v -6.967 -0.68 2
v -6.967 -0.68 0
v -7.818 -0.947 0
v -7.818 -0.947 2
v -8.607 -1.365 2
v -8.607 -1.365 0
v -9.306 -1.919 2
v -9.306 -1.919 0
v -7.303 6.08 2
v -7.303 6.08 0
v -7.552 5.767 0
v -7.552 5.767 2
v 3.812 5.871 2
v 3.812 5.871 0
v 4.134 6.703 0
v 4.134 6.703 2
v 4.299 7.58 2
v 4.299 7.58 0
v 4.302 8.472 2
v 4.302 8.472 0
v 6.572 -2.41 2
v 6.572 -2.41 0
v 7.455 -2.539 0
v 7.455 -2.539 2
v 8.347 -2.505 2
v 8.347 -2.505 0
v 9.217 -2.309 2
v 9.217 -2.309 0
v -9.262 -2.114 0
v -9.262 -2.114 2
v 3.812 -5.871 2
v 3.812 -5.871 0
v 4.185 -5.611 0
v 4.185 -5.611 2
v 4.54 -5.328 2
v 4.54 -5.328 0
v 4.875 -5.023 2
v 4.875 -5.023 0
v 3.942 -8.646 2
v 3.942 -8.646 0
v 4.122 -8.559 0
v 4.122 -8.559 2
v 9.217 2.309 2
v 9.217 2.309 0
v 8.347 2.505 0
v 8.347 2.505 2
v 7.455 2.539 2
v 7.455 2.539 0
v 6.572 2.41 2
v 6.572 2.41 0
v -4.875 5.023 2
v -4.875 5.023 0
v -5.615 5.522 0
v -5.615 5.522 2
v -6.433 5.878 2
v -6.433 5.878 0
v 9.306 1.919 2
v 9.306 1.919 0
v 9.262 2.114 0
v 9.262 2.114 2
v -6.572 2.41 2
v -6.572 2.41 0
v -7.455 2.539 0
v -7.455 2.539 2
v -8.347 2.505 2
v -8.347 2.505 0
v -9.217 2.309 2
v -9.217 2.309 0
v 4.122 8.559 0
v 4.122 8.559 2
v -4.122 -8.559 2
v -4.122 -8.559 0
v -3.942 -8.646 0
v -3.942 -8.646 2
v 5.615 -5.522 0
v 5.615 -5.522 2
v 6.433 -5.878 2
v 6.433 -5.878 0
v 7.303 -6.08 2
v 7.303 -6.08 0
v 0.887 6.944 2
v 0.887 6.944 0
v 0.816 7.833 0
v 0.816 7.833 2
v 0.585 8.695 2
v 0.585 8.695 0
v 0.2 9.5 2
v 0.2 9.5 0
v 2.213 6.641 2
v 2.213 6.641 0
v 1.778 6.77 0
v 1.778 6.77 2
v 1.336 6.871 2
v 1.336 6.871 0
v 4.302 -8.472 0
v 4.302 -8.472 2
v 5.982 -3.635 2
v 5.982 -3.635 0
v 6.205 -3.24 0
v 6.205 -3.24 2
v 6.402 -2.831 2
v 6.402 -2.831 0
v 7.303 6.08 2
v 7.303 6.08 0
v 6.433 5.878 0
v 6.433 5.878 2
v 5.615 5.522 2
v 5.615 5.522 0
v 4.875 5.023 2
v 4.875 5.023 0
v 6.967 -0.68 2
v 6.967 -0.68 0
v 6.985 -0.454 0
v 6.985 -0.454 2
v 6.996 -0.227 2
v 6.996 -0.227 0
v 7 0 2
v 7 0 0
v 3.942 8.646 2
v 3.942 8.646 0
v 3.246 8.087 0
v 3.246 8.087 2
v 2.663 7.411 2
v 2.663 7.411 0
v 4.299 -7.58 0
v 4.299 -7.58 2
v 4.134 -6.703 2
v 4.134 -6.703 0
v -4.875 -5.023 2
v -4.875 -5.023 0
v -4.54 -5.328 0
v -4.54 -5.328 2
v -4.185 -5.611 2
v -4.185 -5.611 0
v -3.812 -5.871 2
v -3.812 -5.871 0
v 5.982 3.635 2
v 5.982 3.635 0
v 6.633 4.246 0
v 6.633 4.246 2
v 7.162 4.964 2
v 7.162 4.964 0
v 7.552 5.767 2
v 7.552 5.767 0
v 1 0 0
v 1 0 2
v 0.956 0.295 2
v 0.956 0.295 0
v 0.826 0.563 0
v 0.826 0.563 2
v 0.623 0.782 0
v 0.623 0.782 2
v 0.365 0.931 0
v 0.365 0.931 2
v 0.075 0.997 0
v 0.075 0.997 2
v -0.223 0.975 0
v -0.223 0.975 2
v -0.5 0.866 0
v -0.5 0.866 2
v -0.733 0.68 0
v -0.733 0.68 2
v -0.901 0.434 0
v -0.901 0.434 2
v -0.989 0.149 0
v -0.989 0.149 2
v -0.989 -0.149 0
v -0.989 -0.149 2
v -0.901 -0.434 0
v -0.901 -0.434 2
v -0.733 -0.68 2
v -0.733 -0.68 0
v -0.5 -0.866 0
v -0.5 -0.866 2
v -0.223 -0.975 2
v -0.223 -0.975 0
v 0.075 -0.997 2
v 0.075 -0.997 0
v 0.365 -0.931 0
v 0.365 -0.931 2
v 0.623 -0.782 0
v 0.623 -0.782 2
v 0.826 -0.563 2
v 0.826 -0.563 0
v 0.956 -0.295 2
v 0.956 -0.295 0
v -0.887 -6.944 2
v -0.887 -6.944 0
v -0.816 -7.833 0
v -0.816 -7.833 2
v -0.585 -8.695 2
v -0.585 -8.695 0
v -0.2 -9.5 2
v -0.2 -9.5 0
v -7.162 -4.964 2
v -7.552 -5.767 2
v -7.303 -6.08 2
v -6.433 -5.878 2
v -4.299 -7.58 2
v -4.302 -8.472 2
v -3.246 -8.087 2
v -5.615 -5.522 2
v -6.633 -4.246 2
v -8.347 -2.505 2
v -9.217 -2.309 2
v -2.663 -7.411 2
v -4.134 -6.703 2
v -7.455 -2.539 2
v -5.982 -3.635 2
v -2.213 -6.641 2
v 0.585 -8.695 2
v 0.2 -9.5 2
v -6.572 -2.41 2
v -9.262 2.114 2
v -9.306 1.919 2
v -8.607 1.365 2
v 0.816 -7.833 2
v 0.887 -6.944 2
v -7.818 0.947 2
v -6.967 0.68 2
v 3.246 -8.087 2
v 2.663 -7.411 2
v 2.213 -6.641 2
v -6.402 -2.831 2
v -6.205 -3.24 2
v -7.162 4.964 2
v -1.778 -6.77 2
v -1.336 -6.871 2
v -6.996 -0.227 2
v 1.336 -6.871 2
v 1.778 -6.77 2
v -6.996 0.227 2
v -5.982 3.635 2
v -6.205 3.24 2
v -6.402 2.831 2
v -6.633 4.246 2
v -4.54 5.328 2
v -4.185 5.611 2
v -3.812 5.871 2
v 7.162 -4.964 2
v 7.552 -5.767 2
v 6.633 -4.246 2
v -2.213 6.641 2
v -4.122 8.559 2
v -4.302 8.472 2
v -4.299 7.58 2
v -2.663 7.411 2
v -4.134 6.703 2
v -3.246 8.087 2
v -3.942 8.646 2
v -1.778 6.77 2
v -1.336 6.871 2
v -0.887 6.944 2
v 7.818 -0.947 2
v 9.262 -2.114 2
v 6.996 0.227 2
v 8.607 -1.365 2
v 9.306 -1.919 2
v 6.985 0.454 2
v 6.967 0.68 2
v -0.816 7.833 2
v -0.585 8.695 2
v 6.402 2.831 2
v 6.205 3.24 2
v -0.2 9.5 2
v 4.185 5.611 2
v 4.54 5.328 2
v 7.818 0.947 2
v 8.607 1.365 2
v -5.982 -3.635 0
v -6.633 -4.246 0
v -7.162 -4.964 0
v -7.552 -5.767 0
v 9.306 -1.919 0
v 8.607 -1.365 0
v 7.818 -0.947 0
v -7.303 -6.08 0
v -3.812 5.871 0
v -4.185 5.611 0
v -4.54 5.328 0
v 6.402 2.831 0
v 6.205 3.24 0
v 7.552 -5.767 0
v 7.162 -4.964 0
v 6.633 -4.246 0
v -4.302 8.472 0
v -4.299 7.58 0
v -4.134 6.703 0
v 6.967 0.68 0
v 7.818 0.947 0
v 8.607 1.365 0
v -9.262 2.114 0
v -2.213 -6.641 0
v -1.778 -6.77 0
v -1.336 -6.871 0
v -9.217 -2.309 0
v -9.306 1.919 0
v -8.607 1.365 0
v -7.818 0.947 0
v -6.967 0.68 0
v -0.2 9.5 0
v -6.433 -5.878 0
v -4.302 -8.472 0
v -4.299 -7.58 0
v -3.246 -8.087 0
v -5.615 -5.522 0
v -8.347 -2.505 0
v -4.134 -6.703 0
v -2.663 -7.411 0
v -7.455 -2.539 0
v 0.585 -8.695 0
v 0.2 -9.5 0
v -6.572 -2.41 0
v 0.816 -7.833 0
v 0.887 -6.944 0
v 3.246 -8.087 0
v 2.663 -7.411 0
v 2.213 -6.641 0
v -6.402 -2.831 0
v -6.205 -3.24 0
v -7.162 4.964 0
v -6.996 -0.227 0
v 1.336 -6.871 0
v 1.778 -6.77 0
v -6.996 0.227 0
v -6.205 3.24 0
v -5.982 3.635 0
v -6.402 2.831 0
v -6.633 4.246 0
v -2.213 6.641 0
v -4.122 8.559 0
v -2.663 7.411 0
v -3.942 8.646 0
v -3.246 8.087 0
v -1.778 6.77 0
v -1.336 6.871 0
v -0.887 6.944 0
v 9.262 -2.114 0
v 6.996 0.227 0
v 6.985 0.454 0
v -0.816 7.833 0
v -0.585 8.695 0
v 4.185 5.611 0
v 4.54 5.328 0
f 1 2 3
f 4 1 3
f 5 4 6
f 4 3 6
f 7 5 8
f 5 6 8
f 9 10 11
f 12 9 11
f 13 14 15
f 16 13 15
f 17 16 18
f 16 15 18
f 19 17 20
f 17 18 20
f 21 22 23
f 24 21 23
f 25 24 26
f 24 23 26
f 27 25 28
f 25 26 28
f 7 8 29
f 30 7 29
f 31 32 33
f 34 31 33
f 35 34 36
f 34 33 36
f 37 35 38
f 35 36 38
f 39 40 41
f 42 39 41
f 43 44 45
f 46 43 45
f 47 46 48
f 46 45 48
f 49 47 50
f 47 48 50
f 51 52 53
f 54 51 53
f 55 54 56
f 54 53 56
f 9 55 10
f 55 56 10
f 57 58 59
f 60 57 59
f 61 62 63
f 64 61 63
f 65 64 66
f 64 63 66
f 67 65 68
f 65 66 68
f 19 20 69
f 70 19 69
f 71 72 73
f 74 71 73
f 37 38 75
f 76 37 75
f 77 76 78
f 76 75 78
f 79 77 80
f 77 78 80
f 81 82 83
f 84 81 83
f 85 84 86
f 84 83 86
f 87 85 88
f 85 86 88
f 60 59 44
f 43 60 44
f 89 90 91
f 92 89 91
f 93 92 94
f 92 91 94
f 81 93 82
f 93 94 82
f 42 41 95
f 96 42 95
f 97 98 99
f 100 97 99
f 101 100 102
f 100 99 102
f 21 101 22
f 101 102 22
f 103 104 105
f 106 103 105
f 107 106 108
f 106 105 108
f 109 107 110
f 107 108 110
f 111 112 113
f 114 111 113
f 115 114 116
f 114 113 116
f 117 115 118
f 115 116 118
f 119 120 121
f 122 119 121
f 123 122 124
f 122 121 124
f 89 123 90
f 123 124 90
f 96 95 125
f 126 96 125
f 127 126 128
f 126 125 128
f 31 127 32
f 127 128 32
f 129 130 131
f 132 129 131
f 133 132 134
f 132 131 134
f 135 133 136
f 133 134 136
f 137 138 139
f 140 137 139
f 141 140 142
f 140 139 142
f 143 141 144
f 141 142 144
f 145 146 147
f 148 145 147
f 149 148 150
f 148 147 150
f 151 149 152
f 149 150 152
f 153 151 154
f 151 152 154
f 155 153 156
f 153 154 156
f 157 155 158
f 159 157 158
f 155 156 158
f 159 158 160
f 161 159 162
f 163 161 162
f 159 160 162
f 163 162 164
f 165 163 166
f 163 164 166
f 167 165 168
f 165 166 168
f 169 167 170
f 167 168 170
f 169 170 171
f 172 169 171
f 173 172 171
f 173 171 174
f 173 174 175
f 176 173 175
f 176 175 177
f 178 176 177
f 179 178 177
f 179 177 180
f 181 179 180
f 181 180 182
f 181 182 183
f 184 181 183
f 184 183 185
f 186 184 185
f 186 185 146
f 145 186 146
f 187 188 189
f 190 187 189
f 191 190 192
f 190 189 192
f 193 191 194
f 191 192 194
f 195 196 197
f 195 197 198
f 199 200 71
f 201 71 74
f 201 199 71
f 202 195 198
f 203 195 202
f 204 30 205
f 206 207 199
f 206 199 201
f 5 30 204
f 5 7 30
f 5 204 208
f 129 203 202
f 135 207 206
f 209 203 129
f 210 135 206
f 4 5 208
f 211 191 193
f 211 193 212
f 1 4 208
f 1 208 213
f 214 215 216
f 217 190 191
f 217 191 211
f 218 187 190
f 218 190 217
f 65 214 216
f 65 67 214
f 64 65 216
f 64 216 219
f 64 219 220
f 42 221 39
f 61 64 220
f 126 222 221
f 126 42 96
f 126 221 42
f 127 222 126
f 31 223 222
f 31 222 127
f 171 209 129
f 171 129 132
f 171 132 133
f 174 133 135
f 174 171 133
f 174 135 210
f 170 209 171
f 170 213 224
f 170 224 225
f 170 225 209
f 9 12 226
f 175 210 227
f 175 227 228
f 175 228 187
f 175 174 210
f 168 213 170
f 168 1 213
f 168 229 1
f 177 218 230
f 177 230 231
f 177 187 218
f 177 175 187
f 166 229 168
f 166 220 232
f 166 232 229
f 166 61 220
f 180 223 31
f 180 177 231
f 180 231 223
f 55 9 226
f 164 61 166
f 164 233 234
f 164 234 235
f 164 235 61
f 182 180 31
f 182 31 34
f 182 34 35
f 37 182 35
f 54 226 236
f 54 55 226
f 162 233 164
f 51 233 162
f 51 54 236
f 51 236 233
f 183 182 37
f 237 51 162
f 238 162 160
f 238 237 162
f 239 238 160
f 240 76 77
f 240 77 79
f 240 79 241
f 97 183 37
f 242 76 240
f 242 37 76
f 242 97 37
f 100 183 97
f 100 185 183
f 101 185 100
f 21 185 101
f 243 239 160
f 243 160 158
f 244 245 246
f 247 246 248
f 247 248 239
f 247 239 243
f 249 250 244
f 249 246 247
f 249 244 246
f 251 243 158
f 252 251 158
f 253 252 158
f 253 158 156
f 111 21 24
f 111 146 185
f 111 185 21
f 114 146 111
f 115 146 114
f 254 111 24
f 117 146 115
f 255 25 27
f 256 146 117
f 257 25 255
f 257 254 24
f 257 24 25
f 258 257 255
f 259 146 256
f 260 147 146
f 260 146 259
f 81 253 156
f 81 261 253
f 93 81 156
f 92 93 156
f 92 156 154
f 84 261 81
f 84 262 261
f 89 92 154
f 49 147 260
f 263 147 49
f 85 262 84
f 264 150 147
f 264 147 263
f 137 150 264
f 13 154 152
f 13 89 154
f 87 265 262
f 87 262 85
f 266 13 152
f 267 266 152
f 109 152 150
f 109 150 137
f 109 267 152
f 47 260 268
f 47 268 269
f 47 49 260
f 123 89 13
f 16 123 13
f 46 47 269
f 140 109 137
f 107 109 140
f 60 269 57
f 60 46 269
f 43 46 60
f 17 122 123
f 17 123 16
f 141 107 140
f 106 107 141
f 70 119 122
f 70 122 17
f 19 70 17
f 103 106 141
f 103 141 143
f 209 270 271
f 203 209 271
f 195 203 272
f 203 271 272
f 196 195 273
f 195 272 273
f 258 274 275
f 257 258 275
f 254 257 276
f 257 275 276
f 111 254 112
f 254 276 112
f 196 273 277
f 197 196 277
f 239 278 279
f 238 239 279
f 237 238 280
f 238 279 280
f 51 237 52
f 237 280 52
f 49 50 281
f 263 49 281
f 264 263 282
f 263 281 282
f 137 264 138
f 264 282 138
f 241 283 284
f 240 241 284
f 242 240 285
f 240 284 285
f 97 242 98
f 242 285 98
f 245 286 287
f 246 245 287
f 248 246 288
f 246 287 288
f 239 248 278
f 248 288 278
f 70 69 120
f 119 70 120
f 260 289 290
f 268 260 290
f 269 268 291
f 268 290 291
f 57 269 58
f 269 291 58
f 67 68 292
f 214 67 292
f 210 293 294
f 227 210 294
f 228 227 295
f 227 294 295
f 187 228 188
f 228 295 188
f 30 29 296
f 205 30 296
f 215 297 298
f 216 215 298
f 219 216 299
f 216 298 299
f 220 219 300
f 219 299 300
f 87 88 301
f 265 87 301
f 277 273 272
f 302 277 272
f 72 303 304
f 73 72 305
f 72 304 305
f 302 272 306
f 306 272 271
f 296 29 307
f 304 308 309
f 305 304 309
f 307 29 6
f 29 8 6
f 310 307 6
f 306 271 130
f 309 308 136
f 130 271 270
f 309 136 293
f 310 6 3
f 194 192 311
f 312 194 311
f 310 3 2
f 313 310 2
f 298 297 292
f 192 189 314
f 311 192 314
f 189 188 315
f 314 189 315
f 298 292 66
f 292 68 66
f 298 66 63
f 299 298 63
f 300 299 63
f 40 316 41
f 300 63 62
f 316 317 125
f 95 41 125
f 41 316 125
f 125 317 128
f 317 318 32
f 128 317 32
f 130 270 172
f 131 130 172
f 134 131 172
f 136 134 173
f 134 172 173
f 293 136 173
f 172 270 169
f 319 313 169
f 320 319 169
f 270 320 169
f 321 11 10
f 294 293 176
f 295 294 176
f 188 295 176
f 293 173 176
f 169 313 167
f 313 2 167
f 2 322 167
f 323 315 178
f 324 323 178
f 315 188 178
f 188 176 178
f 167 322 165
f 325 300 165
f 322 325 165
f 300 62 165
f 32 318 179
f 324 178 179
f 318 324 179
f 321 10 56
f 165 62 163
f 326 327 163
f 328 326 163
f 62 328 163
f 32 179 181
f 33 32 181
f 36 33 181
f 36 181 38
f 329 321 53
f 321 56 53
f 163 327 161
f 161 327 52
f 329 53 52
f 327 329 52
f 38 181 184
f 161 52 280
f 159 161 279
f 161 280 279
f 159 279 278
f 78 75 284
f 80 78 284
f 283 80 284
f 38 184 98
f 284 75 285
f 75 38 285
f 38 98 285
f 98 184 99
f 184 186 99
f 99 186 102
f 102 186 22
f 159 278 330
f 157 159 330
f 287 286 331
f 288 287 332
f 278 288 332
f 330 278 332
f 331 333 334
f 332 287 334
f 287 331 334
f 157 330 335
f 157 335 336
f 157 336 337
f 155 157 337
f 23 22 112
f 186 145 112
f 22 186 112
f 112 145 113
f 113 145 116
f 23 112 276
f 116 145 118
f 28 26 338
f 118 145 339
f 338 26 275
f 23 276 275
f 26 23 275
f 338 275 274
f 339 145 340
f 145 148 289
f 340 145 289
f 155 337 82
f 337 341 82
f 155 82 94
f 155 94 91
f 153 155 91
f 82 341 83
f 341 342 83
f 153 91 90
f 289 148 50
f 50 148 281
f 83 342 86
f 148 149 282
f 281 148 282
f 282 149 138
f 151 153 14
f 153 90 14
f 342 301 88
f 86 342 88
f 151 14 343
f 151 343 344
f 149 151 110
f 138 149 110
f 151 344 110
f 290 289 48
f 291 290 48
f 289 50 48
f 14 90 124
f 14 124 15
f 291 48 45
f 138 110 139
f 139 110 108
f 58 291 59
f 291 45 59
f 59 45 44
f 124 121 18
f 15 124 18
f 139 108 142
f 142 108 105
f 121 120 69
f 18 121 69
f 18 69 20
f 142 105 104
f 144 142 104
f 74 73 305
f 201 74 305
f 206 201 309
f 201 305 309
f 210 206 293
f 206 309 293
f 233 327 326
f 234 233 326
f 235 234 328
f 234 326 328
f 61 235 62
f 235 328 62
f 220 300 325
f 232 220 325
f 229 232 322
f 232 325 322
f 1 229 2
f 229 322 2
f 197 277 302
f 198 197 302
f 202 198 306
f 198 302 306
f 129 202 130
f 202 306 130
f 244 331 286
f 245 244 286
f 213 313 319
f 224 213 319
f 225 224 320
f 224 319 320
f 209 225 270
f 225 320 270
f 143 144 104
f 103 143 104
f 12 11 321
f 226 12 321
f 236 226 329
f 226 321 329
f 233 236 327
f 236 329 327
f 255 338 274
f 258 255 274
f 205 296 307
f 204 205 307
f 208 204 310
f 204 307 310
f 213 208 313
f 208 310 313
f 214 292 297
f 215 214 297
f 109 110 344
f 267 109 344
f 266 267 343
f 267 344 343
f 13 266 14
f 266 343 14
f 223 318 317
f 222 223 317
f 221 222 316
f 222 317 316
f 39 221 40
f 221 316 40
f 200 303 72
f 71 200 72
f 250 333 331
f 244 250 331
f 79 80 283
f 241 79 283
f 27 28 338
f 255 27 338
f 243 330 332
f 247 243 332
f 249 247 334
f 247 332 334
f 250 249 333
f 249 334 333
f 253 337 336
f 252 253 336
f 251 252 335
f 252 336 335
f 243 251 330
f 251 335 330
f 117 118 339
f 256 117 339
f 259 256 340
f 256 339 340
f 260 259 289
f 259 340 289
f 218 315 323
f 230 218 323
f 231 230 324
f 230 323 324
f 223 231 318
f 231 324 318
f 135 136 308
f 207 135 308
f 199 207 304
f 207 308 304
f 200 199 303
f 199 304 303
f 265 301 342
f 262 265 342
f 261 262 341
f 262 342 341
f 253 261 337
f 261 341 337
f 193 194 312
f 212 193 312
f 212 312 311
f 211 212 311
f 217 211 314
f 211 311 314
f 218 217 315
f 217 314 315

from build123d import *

# Parameters (mm, degrees)
F1_DEPTH = 2
F2_R     = 1
F3_DEPTH = 25


with BuildPart() as f1:
    # F0 (on Top) → F1 (new body)
    with BuildSketch(Plane.XY):
        with BuildLine():
            ThreePointArc((6.966901, -0.679915), (6.99172, -0.34036), (7, 0))
            ThreePointArc((7, 0), (6.99172, 0.34036), (6.966901, 0.679915))
            ThreePointArc((6.966901, 0.679915), (6.824495, 1.557647), (6.571965, 2.410243))
            ThreePointArc((6.571965, 2.410243), (6.306782, 3.037186), (5.981957, 3.635407))
            ThreePointArc((5.981957, 3.635407), (5.47282, 4.364429), (4.875371, 5.023023))
            ThreePointArc((4.875371, 5.023023), (4.364429, 5.47282), (3.812213, 5.870863))
            ThreePointArc((3.812213, 5.870863), (3.037186, 6.306782), (2.213149, 6.640931))
            ThreePointArc((2.213149, 6.640931), (1.557647, 6.824495), (0.887413, 6.943522))
            ThreePointArc((0.887413, 6.943522), (0, 7), (-0.887413, 6.943522))
            ThreePointArc((-0.887413, 6.943522), (-1.557647, 6.824495), (-2.213149, 6.640931))
            ThreePointArc((-2.213149, 6.640931), (-3.037186, 6.306782), (-3.812213, 5.870863))
            ThreePointArc((-3.812213, 5.870863), (-4.364429, 5.47282), (-4.875371, 5.023023))
            ThreePointArc((-4.875371, 5.023023), (-5.47282, 4.364429), (-5.981957, 3.635407))
            ThreePointArc((-5.981957, 3.635407), (-6.306782, 3.037186), (-6.571965, 2.410243))
            ThreePointArc((-6.571965, 2.410243), (-6.824495, 1.557647), (-6.966901, 0.679915))
            ThreePointArc((-6.966901, 0.679915), (-7, 0), (-6.966901, -0.679915))
            ThreePointArc((-6.966901, -0.679915), (-6.824495, -1.557647), (-6.571965, -2.410243))
            ThreePointArc((-6.571965, -2.410243), (-6.306782, -3.037186), (-5.981957, -3.635407))
            ThreePointArc((-5.981957, -3.635407), (-5.47282, -4.364429), (-4.875371, -5.023023))
            ThreePointArc((-4.875371, -5.023023), (-4.364429, -5.47282), (-3.812213, -5.870863))
            ThreePointArc((-3.812213, -5.870863), (-3.037186, -6.306782), (-2.213149, -6.640931))
            ThreePointArc((-2.213149, -6.640931), (-1.557647, -6.824495), (-0.887413, -6.943522))
            ThreePointArc((-0.887413, -6.943522), (0, -7), (0.887413, -6.943522))
            ThreePointArc((0.887413, -6.943522), (1.557647, -6.824495), (2.213149, -6.640931))
            ThreePointArc((2.213149, -6.640931), (3.037186, -6.306782), (3.812213, -5.870863))
            ThreePointArc((3.812213, -5.870863), (4.364429, -5.47282), (4.875371, -5.023023))
            ThreePointArc((4.875371, -5.023023), (5.47282, -4.364429), (5.981957, -3.635407))
            ThreePointArc((5.981957, -3.635407), (6.306782, -3.037186), (6.571965, -2.410243))
            ThreePointArc((6.571965, -2.410243), (6.824495, -1.557647), (6.966901, -0.679915))
        make_face()
        with BuildLine():
            ThreePointArc((6.571965, 2.410243), (6.824495, 1.557647), (6.966901, 0.679915))
            ThreePointArc((6.966901, 0.679915), (8.222094, 1.13804), (9.306319, 1.918963))
            Line((9.306319, 1.918963), (9.261815, 2.113949))
            Line((9.261815, 2.113949), (9.217311, 2.308934))
            ThreePointArc((9.217311, 2.308934), (7.901628, 2.542094), (6.571965, 2.410243))
        make_face()
        with BuildLine():
            ThreePointArc((9.306319, -1.918963), (8.222094, -1.13804), (6.966901, -0.679915))
            ThreePointArc((6.966901, -0.679915), (6.824495, -1.557647), (6.571965, -2.410243))
            ThreePointArc((6.571965, -2.410243), (7.901628, -2.542094), (9.217311, -2.308934))
            Line((9.217311, -2.308934), (9.261815, -2.113949))
            Line((9.261815, -2.113949), (9.306319, -1.918963))
        make_face()
        with BuildLine():
            ThreePointArc((4.875371, 5.023023), (5.47282, 4.364429), (5.981957, 3.635407))
            ThreePointArc((5.981957, 3.635407), (6.914074, 4.592771), (7.552097, 5.766787))
            Line((7.552097, 5.766787), (7.427399, 5.923153))
            Line((7.427399, 5.923153), (7.302701, 6.079519))
            ThreePointArc((7.302701, 6.079519), (6.016147, 5.718736), (4.875371, 5.023023))
        make_face()
        with BuildLine():
            ThreePointArc((7.552097, -5.766787), (6.914074, -4.592771), (5.981957, -3.635407))
            ThreePointArc((5.981957, -3.635407), (5.47282, -4.364429), (4.875371, -5.023023))
            ThreePointArc((4.875371, -5.023023), (6.016147, -5.718736), (7.302701, -6.079519))
            Line((7.302701, -6.079519), (7.427399, -5.923153))
            Line((7.427399, -5.923153), (7.552097, -5.766787))
        make_face()
        with BuildLine():
            ThreePointArc((2.213149, 6.640931), (3.037186, 6.306782), (3.812213, 5.870863))
            ThreePointArc((3.812213, 5.870863), (4.236636, 7.137848), (4.302089, 8.472427))
            Line((4.302089, 8.472427), (4.121896, 8.559204))
            Line((4.121896, 8.559204), (3.941702, 8.645981))
            ThreePointArc((3.941702, 8.645981), (2.939095, 7.762711), (2.213149, 6.640931))
        make_face()
        with BuildLine():
            ThreePointArc((4.302089, -8.472427), (4.236636, -7.137848), (3.812213, -5.870863))
            ThreePointArc((3.812213, -5.870863), (3.037186, -6.306782), (2.213149, -6.640931))
            ThreePointArc((2.213149, -6.640931), (2.939095, -7.762711), (3.941702, -8.645981))
            Line((3.941702, -8.645981), (4.121896, -8.559204))
            Line((4.121896, -8.559204), (4.302089, -8.472427))
        make_face()
        with BuildLine():
            ThreePointArc((-0.887413, 6.943522), (0, 7), (0.887413, 6.943522))
            ThreePointArc((0.887413, 6.943522), (0.720081, 8.269186), (0.2, 9.5))
            Line((0.2, 9.5), (0, 9.5))
            Line((0, 9.5), (-0.2, 9.5))
            ThreePointArc((-0.2, 9.5), (-0.720081, 8.269186), (-0.887413, 6.943522))
        make_face()
        with BuildLine():
            ThreePointArc((0.2, -9.5), (0.720081, -8.269186), (0.887413, -6.943522))
            ThreePointArc((0.887413, -6.943522), (0, -7), (-0.887413, -6.943522))
            ThreePointArc((-0.887413, -6.943522), (-0.720081, -8.269186), (-0.2, -9.5))
            Line((-0.2, -9.5), (0, -9.5))
            Line((0, -9.5), (0.2, -9.5))
        make_face()
        with BuildLine():
            ThreePointArc((-3.812213, 5.870863), (-3.037186, 6.306782), (-2.213149, 6.640931))
            ThreePointArc((-2.213149, 6.640931), (-2.939095, 7.762711), (-3.941702, 8.645981))
            Line((-3.941702, 8.645981), (-4.121896, 8.559204))
            Line((-4.121896, 8.559204), (-4.302089, 8.472427))
            ThreePointArc((-4.302089, 8.472427), (-4.236636, 7.137848), (-3.812213, 5.870863))
        make_face()
        with BuildLine():
            ThreePointArc((-3.941702, -8.645981), (-2.939095, -7.762711), (-2.213149, -6.640931))
            ThreePointArc((-2.213149, -6.640931), (-3.037186, -6.306782), (-3.812213, -5.870863))
            ThreePointArc((-3.812213, -5.870863), (-4.236636, -7.137848), (-4.302089, -8.472427))
            Line((-4.302089, -8.472427), (-4.121896, -8.559204))
            Line((-4.121896, -8.559204), (-3.941702, -8.645981))
        make_face()
        with BuildLine():
            ThreePointArc((-5.981957, 3.635407), (-5.47282, 4.364429), (-4.875371, 5.023023))
            ThreePointArc((-4.875371, 5.023023), (-6.016147, 5.718736), (-7.302701, 6.079519))
            Line((-7.302701, 6.079519), (-7.427399, 5.923153))
            Line((-7.427399, 5.923153), (-7.552097, 5.766787))
            ThreePointArc((-7.552097, 5.766787), (-6.914074, 4.592771), (-5.981957, 3.635407))
        make_face()
        with BuildLine():
            ThreePointArc((-7.302701, -6.079519), (-6.016147, -5.718736), (-4.875371, -5.023023))
            ThreePointArc((-4.875371, -5.023023), (-5.47282, -4.364429), (-5.981957, -3.635407))
            ThreePointArc((-5.981957, -3.635407), (-6.914074, -4.592771), (-7.552097, -5.766787))
            Line((-7.552097, -5.766787), (-7.427399, -5.923153))
            Line((-7.427399, -5.923153), (-7.302701, -6.079519))
        make_face()
        with BuildLine():
            ThreePointArc((-6.966901, 0.679915), (-6.824495, 1.557647), (-6.571965, 2.410243))
            ThreePointArc((-6.571965, 2.410243), (-7.901628, 2.542094), (-9.217311, 2.308934))
            Line((-9.217311, 2.308934), (-9.261815, 2.113949))
            Line((-9.261815, 2.113949), (-9.306319, 1.918963))
            ThreePointArc((-9.306319, 1.918963), (-8.222094, 1.13804), (-6.966901, 0.679915))
        make_face()
        with BuildLine():
            ThreePointArc((-9.217311, -2.308934), (-7.901628, -2.542094), (-6.571965, -2.410243))
            ThreePointArc((-6.571965, -2.410243), (-6.824495, -1.557647), (-6.966901, -0.679915))
            ThreePointArc((-6.966901, -0.679915), (-8.222094, -1.13804), (-9.306319, -1.918963))
            Line((-9.306319, -1.918963), (-9.261815, -2.113949))
            Line((-9.261815, -2.113949), (-9.217311, -2.308934))
        make_face()
    extrude(amount=F1_DEPTH)

    # F2 (on face) → F3 (cut)
    with BuildSketch(Plane.XY.offset(2)):
        Circle(F2_R)
    extrude(amount=-F3_DEPTH, mode=Mode.SUBTRACT)


solid = f1.part
